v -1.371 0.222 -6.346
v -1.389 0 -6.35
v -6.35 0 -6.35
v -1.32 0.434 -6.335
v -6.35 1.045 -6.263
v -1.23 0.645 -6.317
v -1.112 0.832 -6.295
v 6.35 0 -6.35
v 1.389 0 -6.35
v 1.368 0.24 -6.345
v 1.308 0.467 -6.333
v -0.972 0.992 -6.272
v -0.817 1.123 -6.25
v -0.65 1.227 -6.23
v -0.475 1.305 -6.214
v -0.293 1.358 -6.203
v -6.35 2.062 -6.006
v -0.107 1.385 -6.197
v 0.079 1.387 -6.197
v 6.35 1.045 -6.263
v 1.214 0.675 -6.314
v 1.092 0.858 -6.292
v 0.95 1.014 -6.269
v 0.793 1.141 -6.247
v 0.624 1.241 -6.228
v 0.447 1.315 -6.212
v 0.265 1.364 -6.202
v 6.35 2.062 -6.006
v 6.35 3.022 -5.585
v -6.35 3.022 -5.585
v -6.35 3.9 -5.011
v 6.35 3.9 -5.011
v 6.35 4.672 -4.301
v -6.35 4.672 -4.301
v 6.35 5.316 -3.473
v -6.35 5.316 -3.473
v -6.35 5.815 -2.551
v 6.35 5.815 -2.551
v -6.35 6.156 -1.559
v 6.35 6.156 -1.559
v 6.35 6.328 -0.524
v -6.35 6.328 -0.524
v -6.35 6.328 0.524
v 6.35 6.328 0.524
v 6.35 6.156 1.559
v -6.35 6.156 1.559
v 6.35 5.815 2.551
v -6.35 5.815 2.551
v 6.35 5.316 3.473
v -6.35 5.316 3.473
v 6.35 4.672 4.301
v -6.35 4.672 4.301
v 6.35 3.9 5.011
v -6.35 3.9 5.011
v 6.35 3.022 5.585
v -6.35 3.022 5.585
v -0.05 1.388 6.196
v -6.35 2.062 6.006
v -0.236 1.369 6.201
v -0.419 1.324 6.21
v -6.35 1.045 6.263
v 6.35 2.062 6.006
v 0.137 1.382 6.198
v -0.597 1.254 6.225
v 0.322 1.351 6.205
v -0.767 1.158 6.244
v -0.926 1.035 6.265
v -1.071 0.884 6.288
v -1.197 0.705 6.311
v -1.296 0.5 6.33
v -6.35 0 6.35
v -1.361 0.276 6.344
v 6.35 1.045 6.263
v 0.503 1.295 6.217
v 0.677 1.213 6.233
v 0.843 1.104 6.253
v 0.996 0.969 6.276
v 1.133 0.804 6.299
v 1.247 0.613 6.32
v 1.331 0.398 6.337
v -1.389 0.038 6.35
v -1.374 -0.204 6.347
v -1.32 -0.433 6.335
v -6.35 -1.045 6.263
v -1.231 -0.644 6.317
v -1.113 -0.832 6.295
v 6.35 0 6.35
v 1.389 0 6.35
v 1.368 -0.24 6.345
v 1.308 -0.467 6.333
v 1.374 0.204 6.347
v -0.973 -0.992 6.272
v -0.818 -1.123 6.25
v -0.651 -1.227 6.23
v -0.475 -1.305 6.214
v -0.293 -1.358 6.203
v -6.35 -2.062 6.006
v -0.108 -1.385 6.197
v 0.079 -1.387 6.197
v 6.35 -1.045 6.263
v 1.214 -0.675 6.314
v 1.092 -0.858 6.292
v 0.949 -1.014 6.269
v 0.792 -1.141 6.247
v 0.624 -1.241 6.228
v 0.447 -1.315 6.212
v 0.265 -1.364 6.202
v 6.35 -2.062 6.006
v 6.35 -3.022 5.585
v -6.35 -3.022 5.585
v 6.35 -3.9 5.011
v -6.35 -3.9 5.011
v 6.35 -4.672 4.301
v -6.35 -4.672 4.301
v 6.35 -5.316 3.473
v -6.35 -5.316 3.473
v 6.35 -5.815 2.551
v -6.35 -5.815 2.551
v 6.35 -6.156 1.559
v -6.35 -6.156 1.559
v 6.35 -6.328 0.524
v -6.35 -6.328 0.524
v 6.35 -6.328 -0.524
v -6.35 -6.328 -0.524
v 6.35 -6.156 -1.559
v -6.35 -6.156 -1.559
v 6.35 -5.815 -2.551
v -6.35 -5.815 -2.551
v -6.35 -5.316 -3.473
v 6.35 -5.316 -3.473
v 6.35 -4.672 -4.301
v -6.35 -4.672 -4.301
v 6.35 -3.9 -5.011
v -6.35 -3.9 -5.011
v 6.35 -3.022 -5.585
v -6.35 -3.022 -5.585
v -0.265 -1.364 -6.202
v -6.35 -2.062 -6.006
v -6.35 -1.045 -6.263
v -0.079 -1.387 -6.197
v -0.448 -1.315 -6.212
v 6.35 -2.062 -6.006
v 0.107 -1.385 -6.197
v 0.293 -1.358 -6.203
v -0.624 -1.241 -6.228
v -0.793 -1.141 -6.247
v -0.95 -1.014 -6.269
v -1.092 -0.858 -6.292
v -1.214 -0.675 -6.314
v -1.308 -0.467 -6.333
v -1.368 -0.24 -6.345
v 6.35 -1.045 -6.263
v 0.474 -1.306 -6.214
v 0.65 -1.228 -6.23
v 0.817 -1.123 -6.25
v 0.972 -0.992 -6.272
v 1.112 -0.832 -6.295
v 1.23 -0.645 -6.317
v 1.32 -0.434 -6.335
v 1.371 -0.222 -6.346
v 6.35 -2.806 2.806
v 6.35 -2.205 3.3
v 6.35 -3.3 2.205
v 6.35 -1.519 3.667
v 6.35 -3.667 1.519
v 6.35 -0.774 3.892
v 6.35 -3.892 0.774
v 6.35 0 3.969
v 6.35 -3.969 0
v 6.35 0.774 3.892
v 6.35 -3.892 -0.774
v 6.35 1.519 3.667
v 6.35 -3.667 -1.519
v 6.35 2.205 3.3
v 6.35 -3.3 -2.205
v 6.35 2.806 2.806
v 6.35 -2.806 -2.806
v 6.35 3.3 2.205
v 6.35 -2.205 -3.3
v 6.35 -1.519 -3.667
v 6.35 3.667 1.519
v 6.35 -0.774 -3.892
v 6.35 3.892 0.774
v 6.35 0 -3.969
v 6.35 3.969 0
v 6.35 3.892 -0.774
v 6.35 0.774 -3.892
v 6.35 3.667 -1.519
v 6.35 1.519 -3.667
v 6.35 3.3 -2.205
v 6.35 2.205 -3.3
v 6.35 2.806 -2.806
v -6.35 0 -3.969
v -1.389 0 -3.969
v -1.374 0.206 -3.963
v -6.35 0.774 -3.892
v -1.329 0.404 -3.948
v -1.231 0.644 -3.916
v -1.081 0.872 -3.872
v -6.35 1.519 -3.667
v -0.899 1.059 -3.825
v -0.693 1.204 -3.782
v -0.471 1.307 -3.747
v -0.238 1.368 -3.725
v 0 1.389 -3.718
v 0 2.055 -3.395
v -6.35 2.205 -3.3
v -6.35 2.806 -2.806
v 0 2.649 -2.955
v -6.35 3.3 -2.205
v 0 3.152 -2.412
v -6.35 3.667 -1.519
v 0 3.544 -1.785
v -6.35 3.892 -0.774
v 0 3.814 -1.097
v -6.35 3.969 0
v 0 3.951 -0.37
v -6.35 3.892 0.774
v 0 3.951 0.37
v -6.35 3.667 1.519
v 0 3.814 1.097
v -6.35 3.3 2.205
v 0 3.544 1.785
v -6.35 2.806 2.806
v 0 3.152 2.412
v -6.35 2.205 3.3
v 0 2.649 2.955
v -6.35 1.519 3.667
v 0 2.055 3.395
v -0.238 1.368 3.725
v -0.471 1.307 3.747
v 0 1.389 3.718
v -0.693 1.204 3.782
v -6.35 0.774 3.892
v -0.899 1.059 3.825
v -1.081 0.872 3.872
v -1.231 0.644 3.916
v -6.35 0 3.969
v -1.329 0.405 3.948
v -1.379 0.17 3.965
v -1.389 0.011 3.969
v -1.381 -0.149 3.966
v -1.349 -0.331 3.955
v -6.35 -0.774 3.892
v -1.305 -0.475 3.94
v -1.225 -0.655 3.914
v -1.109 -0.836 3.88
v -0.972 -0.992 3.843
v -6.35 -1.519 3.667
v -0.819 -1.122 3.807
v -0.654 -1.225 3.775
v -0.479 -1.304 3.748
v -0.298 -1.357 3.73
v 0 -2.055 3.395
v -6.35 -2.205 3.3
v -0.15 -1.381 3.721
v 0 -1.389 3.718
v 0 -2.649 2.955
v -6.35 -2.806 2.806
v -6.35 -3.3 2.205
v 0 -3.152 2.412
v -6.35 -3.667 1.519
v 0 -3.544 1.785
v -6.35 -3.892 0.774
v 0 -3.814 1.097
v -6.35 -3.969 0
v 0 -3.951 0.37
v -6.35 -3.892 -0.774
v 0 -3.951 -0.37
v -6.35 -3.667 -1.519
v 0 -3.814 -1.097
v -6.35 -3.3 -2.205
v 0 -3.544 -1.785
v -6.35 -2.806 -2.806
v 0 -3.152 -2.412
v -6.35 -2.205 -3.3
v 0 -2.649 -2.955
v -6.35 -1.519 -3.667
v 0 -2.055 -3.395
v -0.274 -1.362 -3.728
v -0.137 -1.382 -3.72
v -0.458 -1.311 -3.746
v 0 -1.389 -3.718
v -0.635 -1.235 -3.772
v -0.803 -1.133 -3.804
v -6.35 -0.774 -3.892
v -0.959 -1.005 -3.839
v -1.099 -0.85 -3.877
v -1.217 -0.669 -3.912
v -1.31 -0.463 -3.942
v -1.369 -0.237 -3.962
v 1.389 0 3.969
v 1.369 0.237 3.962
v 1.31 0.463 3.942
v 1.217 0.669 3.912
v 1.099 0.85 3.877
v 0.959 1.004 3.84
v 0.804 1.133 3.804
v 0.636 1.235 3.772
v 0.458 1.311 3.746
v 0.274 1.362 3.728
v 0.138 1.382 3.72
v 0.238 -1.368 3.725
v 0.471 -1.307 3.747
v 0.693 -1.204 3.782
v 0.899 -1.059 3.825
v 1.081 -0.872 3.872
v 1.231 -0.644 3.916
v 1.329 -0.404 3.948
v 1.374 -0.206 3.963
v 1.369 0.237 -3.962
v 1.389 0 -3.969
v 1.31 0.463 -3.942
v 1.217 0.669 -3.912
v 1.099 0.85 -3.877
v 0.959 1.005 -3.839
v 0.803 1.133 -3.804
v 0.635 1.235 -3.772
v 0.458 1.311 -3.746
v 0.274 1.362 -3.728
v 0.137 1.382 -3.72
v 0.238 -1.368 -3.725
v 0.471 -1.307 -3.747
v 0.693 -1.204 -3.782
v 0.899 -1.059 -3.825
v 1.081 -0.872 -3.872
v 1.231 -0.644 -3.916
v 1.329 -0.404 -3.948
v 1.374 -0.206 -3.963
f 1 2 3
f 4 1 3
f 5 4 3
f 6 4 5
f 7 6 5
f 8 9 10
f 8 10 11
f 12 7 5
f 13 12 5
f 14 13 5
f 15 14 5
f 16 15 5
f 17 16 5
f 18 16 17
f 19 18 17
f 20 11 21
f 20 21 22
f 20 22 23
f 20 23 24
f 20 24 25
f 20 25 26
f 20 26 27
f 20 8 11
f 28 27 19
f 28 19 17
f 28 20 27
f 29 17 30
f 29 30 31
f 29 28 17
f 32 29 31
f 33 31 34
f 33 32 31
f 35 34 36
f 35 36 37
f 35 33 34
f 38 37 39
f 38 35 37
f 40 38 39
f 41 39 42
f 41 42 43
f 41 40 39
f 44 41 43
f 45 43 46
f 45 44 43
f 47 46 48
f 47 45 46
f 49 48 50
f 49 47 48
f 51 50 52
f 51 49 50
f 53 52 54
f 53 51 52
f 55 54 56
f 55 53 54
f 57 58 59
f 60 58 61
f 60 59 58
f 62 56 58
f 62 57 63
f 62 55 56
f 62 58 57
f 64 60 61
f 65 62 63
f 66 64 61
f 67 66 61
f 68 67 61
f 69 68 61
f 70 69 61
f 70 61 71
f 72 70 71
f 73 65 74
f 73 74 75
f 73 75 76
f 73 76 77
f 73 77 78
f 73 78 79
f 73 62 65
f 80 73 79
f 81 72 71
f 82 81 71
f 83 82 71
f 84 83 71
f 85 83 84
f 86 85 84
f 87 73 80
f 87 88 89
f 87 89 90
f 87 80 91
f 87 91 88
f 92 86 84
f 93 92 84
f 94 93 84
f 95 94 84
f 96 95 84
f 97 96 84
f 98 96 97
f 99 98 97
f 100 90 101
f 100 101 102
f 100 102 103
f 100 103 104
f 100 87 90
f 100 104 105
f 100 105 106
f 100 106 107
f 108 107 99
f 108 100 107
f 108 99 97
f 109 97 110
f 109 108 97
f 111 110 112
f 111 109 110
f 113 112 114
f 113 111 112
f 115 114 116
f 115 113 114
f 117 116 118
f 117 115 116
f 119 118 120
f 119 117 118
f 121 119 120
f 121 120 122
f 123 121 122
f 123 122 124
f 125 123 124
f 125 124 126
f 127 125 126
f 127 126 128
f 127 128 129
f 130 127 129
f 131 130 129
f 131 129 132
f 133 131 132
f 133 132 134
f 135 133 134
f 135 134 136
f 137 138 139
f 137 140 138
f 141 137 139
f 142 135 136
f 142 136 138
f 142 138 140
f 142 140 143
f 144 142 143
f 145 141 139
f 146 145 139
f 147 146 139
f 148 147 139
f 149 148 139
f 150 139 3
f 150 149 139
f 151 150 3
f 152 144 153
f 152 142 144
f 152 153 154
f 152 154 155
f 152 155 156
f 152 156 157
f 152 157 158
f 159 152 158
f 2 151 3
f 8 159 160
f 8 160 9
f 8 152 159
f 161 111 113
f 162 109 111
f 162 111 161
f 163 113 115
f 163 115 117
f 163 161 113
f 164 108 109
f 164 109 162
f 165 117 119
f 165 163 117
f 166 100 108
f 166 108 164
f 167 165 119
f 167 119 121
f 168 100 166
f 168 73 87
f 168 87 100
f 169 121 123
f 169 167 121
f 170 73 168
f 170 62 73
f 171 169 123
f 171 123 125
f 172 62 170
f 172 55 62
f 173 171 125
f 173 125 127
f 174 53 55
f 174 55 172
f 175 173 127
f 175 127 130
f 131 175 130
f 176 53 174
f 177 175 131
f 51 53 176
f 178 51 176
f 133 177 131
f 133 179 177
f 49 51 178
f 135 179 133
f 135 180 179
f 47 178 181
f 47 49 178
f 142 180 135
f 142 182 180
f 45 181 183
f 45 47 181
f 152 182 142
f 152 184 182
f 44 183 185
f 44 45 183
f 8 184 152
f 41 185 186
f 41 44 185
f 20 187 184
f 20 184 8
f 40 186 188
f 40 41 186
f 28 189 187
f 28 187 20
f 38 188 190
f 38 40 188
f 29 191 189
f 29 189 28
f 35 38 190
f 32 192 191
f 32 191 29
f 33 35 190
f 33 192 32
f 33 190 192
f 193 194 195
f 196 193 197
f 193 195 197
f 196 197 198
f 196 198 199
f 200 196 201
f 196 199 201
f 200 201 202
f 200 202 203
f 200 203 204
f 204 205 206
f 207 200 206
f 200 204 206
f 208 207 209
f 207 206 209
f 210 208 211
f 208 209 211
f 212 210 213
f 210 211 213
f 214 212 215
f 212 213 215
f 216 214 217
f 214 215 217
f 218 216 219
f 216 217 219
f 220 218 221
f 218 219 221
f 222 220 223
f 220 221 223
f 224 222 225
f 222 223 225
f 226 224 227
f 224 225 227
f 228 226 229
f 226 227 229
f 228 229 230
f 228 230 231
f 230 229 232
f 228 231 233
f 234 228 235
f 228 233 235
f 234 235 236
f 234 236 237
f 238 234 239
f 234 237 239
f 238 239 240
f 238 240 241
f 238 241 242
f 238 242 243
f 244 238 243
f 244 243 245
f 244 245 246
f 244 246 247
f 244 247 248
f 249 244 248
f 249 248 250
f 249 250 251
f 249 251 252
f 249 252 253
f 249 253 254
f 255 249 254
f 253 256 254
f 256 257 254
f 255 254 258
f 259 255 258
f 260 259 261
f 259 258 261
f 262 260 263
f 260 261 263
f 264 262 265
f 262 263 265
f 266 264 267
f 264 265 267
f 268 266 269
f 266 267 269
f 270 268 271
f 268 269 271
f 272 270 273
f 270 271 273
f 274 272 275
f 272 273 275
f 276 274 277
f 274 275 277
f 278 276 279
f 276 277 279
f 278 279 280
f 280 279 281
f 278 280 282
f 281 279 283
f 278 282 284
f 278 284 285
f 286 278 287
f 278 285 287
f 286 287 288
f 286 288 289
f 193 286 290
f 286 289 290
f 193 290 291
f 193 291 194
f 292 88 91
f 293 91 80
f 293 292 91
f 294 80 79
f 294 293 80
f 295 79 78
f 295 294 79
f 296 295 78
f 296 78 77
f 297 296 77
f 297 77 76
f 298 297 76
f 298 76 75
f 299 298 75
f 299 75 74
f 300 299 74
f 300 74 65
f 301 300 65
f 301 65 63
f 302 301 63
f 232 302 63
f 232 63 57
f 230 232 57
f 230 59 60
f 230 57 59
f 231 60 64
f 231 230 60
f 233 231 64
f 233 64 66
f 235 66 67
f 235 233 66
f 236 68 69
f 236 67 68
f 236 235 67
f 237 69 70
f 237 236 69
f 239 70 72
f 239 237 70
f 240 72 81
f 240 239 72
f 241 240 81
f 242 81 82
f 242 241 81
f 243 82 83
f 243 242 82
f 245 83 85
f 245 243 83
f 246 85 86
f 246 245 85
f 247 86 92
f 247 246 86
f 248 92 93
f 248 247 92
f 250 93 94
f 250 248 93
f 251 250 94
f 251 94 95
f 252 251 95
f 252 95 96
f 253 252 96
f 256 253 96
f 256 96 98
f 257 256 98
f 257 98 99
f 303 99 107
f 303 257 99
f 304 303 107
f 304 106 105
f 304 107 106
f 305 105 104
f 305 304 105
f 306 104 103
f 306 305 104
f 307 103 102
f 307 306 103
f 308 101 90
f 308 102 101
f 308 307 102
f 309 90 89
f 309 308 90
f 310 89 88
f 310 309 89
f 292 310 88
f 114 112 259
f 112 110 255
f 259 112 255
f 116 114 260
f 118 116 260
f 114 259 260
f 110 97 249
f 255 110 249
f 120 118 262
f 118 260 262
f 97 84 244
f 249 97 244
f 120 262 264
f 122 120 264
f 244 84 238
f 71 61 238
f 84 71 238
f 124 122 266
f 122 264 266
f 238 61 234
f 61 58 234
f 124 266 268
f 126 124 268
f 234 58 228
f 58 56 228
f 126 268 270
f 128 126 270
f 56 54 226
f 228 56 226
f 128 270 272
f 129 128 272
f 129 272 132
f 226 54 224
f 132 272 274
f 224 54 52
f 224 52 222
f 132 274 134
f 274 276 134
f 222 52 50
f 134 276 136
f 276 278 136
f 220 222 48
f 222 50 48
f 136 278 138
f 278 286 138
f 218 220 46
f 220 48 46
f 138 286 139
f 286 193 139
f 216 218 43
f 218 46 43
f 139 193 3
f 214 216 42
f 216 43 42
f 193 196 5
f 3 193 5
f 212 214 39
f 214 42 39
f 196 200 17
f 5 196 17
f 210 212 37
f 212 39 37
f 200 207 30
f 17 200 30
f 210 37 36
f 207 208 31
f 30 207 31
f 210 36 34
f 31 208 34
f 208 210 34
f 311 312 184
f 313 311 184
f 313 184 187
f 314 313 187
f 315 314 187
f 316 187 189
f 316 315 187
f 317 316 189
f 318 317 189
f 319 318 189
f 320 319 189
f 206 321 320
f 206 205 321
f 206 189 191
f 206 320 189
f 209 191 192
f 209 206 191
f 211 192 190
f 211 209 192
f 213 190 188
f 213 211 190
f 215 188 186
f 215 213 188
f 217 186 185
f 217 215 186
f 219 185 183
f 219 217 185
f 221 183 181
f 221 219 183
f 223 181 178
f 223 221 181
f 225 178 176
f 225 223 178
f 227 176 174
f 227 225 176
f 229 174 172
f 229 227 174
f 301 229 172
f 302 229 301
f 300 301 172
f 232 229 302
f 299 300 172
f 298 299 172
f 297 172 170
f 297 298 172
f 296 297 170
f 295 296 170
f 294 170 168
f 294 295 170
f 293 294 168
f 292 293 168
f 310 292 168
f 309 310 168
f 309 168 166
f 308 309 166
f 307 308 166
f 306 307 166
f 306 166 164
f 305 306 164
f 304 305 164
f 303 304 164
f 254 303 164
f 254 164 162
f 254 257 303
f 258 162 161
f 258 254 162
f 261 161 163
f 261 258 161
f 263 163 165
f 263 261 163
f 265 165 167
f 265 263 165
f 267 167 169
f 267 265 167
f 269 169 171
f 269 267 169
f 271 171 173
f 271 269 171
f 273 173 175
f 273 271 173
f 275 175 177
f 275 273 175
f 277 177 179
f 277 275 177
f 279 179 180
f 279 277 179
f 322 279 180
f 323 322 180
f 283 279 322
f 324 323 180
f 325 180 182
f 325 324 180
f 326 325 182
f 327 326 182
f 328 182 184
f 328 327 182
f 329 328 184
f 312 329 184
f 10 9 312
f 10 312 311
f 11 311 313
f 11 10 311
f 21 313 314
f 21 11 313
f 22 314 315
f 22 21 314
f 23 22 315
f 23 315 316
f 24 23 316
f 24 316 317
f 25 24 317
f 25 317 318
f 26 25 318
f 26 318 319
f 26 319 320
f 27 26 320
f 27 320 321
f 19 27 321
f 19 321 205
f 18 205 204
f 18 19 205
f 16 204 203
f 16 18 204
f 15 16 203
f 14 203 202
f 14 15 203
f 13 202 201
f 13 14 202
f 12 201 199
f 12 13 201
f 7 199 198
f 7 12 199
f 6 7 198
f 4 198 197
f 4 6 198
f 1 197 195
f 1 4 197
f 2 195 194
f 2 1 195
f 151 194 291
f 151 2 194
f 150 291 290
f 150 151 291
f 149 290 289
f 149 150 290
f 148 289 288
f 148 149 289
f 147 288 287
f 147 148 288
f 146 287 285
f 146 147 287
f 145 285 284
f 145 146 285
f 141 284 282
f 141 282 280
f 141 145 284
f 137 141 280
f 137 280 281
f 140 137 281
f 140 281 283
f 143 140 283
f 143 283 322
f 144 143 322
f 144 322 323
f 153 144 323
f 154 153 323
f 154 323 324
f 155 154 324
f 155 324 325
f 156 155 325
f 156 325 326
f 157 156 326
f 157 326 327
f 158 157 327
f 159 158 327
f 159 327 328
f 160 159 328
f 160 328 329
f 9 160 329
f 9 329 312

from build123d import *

# Parameters (mm, degrees)
SKETCH1_R           = 6.35
SKETCH1_R_2         = 3.96875
EXTRUDE1_DEPTH      = 6.35
EXTRUDE1_DEPTH_BACK = 6.35
CUT_EXTRUDE1_START  = -6.35
SKETCH2_R           = 1.3890625
CUT_EXTRUDE1_DEPTH  = 12.7


with BuildPart() as part:
    # Sketch1 → Extrude1 (new body, two sides)
    with BuildSketch(Plane(origin=(0, 0, 0), x_dir=(0, 0, -1), z_dir=(1, 0, 0))) as extrude1_sk:
        Circle(SKETCH1_R)
        Circle(SKETCH1_R_2, mode=Mode.SUBTRACT)
    extrude(amount=EXTRUDE1_DEPTH)
    extrude(extrude1_sk.sketch, amount=-EXTRUDE1_DEPTH_BACK)

    # Sketch2 → Cut-Extrude1 (cut)
    with BuildSketch(Plane.XY.offset(CUT_EXTRUDE1_START)):
        Circle(SKETCH2_R)
    extrude(amount=CUT_EXTRUDE1_DEPTH, mode=Mode.SUBTRACT)


solid = part.part
